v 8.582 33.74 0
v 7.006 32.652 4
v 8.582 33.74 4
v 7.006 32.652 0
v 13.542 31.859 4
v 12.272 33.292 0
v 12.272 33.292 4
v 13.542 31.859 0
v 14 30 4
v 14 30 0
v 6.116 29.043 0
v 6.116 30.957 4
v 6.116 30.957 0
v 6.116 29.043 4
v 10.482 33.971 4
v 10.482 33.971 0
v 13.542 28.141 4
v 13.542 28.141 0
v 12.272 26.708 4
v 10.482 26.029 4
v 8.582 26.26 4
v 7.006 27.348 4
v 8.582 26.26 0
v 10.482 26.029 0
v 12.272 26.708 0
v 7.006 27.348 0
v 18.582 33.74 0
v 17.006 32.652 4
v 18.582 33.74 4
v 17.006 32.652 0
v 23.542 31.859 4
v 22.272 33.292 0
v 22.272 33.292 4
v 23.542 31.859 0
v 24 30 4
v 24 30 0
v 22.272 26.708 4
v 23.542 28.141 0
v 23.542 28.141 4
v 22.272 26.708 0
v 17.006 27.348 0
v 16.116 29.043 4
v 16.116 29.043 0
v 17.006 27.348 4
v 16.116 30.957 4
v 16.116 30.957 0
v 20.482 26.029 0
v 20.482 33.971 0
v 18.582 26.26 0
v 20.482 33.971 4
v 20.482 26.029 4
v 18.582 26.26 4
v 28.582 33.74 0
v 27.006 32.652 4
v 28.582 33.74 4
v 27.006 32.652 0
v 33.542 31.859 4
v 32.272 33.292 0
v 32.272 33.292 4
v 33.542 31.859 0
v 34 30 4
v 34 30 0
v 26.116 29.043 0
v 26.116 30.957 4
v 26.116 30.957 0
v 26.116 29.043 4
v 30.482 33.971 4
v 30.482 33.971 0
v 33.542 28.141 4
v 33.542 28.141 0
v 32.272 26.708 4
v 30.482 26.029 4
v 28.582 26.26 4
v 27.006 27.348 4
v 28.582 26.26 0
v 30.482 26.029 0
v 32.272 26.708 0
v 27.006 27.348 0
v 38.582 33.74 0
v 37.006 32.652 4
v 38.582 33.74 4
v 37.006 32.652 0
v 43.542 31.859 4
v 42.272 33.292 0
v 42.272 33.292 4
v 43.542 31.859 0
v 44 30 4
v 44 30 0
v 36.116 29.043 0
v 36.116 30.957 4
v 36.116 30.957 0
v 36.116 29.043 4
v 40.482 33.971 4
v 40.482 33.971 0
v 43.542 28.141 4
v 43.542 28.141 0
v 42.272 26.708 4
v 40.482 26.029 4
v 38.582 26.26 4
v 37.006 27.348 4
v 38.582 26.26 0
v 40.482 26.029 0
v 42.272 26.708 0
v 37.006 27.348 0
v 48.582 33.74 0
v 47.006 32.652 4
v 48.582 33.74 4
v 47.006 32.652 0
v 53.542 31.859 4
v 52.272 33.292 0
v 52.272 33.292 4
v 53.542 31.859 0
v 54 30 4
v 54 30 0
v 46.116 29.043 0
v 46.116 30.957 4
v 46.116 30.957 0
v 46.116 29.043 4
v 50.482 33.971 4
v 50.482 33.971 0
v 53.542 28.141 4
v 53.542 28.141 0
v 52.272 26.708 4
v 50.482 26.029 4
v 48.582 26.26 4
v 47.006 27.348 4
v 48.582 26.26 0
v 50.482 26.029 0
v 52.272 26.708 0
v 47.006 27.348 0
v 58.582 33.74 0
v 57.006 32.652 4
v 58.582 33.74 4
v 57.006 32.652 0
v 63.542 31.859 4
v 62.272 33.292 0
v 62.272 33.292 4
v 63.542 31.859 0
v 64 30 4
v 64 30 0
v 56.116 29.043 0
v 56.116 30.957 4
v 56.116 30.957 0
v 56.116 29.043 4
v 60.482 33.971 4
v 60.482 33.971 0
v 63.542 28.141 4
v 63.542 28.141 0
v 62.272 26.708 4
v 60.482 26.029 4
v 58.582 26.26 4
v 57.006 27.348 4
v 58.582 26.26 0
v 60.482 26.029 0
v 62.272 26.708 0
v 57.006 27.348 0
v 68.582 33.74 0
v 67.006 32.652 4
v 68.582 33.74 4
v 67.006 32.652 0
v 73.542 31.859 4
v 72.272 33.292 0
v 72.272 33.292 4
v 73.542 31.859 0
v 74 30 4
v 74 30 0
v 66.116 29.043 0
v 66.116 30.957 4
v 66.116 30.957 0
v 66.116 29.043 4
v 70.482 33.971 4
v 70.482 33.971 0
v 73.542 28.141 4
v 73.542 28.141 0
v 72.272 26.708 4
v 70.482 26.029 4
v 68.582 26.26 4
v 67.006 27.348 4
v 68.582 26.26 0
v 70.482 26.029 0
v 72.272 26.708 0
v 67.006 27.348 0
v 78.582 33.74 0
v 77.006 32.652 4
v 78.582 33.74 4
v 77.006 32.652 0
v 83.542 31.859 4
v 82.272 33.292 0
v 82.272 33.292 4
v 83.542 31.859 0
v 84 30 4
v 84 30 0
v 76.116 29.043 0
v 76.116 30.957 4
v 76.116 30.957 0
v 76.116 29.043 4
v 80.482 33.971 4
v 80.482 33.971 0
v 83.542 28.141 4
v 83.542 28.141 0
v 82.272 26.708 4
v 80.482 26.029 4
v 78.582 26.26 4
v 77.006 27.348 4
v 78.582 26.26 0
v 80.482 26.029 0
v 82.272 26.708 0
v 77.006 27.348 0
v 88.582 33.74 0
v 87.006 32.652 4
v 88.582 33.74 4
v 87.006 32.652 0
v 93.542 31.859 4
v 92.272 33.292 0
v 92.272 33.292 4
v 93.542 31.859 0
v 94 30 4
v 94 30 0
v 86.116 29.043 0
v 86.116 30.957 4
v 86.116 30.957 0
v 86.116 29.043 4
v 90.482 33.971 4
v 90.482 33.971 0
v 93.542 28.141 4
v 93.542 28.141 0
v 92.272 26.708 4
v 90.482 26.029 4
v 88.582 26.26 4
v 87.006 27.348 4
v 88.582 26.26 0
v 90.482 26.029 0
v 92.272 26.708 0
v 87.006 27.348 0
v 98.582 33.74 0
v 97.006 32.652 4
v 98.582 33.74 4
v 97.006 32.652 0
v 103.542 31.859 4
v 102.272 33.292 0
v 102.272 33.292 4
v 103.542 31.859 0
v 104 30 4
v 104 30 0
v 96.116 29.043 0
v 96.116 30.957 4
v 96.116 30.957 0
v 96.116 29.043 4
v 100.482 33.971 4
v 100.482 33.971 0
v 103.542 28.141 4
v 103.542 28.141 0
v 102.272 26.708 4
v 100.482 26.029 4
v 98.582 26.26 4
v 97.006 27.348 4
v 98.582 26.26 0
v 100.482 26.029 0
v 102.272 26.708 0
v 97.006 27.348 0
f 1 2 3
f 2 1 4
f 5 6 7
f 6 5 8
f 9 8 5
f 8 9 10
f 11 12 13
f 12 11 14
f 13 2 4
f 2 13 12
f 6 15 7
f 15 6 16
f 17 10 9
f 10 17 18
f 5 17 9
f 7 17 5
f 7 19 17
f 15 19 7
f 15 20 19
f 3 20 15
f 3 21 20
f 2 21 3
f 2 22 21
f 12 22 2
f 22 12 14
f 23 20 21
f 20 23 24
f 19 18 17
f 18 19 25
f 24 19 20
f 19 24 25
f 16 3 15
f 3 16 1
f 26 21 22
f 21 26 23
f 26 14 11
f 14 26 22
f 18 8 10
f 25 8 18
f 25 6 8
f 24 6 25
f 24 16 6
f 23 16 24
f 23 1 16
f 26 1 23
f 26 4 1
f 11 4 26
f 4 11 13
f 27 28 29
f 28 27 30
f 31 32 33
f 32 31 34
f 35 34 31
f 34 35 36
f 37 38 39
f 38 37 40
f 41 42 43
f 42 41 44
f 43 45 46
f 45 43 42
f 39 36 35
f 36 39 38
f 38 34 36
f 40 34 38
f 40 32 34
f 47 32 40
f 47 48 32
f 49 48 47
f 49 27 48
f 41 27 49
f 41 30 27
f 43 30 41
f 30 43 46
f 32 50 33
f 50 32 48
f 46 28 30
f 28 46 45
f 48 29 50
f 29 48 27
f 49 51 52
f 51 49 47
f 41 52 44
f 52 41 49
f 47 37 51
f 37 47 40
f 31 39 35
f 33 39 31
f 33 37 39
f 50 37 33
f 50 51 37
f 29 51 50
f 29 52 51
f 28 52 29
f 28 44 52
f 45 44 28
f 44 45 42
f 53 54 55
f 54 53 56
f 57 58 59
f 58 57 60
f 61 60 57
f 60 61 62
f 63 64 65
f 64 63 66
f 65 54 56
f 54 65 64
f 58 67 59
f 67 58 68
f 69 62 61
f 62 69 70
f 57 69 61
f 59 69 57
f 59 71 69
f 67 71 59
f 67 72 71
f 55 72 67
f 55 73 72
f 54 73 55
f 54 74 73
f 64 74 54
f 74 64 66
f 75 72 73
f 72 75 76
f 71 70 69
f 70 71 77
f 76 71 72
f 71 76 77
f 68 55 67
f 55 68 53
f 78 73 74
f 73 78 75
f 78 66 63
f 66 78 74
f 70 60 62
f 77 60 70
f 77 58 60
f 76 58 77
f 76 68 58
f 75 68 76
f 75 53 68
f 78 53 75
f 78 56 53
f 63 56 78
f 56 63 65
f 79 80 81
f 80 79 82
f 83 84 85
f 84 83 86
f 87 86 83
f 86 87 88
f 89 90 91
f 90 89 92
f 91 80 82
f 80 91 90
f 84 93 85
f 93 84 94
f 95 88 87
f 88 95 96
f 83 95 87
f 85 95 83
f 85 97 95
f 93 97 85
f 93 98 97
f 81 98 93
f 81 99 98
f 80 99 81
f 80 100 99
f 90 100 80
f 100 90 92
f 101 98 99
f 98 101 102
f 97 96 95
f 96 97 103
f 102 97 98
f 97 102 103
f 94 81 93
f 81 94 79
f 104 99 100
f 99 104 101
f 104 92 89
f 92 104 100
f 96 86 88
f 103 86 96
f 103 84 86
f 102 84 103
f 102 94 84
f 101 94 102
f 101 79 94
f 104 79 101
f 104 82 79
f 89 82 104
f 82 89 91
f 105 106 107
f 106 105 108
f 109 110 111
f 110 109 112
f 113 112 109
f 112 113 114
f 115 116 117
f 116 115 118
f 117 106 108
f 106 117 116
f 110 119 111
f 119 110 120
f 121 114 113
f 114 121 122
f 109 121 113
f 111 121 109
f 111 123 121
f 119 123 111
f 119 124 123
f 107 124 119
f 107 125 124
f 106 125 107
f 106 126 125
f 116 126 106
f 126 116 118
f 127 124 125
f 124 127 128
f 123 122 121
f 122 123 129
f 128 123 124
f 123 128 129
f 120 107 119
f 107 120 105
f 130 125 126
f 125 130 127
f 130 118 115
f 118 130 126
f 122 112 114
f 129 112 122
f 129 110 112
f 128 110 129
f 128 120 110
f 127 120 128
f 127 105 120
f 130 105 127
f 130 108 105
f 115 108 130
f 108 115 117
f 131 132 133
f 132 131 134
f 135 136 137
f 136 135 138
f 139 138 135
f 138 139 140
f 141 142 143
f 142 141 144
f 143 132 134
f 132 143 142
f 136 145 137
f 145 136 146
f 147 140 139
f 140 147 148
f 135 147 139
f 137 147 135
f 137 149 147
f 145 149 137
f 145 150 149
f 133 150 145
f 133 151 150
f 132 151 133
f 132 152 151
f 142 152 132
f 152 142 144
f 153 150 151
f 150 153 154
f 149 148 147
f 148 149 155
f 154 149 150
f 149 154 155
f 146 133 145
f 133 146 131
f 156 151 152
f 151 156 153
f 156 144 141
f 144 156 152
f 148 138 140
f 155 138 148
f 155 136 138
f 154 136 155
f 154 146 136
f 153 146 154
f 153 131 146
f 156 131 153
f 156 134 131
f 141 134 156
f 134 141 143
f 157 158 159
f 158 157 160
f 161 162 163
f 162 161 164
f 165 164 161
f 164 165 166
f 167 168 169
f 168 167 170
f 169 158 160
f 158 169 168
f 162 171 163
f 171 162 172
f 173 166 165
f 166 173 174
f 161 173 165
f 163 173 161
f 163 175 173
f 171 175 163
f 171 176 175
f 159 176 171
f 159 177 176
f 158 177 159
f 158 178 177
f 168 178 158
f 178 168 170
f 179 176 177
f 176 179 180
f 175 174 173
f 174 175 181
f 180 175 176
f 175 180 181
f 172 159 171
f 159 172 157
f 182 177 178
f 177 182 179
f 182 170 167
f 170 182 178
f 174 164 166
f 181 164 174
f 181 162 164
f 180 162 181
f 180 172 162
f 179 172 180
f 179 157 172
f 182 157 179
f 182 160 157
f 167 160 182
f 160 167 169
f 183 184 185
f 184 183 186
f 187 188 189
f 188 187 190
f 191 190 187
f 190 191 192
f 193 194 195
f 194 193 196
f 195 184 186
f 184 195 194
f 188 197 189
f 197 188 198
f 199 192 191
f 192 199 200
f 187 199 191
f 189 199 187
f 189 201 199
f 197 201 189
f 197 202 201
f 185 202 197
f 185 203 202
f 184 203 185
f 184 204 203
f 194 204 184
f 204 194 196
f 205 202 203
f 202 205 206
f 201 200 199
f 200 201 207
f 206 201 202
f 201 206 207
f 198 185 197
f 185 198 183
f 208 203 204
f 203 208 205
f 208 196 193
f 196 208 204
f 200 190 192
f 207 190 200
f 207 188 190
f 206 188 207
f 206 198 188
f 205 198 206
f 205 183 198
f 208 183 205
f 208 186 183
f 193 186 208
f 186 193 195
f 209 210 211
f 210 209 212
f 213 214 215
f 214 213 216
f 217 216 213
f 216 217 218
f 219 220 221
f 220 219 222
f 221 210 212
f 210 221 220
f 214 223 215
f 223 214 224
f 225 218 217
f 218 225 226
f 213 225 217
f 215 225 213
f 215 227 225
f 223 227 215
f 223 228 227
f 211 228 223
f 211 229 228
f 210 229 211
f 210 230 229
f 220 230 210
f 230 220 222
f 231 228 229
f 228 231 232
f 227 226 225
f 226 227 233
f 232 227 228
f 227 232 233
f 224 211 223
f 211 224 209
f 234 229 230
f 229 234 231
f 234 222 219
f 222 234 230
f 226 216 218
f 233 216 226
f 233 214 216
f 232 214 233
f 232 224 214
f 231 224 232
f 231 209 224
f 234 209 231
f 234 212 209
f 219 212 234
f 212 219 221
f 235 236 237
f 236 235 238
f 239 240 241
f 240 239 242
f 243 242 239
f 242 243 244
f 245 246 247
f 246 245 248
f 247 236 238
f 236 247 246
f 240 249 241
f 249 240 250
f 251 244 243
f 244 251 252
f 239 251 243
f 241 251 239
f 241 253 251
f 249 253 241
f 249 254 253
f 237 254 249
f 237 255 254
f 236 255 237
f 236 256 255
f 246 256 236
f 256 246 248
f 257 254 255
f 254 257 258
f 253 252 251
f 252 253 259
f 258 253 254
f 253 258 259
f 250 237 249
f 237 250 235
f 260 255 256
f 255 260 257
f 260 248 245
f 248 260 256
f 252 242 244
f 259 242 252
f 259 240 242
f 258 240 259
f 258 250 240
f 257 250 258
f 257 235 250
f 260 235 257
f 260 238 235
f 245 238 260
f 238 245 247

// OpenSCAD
for (x_position = [10:10:100]) {
    translate([x_position, 30, 0]) cylinder(h=4, r1=4, r2=4); 
    echo("x:", x_position); //a good way to check your mental math
}
